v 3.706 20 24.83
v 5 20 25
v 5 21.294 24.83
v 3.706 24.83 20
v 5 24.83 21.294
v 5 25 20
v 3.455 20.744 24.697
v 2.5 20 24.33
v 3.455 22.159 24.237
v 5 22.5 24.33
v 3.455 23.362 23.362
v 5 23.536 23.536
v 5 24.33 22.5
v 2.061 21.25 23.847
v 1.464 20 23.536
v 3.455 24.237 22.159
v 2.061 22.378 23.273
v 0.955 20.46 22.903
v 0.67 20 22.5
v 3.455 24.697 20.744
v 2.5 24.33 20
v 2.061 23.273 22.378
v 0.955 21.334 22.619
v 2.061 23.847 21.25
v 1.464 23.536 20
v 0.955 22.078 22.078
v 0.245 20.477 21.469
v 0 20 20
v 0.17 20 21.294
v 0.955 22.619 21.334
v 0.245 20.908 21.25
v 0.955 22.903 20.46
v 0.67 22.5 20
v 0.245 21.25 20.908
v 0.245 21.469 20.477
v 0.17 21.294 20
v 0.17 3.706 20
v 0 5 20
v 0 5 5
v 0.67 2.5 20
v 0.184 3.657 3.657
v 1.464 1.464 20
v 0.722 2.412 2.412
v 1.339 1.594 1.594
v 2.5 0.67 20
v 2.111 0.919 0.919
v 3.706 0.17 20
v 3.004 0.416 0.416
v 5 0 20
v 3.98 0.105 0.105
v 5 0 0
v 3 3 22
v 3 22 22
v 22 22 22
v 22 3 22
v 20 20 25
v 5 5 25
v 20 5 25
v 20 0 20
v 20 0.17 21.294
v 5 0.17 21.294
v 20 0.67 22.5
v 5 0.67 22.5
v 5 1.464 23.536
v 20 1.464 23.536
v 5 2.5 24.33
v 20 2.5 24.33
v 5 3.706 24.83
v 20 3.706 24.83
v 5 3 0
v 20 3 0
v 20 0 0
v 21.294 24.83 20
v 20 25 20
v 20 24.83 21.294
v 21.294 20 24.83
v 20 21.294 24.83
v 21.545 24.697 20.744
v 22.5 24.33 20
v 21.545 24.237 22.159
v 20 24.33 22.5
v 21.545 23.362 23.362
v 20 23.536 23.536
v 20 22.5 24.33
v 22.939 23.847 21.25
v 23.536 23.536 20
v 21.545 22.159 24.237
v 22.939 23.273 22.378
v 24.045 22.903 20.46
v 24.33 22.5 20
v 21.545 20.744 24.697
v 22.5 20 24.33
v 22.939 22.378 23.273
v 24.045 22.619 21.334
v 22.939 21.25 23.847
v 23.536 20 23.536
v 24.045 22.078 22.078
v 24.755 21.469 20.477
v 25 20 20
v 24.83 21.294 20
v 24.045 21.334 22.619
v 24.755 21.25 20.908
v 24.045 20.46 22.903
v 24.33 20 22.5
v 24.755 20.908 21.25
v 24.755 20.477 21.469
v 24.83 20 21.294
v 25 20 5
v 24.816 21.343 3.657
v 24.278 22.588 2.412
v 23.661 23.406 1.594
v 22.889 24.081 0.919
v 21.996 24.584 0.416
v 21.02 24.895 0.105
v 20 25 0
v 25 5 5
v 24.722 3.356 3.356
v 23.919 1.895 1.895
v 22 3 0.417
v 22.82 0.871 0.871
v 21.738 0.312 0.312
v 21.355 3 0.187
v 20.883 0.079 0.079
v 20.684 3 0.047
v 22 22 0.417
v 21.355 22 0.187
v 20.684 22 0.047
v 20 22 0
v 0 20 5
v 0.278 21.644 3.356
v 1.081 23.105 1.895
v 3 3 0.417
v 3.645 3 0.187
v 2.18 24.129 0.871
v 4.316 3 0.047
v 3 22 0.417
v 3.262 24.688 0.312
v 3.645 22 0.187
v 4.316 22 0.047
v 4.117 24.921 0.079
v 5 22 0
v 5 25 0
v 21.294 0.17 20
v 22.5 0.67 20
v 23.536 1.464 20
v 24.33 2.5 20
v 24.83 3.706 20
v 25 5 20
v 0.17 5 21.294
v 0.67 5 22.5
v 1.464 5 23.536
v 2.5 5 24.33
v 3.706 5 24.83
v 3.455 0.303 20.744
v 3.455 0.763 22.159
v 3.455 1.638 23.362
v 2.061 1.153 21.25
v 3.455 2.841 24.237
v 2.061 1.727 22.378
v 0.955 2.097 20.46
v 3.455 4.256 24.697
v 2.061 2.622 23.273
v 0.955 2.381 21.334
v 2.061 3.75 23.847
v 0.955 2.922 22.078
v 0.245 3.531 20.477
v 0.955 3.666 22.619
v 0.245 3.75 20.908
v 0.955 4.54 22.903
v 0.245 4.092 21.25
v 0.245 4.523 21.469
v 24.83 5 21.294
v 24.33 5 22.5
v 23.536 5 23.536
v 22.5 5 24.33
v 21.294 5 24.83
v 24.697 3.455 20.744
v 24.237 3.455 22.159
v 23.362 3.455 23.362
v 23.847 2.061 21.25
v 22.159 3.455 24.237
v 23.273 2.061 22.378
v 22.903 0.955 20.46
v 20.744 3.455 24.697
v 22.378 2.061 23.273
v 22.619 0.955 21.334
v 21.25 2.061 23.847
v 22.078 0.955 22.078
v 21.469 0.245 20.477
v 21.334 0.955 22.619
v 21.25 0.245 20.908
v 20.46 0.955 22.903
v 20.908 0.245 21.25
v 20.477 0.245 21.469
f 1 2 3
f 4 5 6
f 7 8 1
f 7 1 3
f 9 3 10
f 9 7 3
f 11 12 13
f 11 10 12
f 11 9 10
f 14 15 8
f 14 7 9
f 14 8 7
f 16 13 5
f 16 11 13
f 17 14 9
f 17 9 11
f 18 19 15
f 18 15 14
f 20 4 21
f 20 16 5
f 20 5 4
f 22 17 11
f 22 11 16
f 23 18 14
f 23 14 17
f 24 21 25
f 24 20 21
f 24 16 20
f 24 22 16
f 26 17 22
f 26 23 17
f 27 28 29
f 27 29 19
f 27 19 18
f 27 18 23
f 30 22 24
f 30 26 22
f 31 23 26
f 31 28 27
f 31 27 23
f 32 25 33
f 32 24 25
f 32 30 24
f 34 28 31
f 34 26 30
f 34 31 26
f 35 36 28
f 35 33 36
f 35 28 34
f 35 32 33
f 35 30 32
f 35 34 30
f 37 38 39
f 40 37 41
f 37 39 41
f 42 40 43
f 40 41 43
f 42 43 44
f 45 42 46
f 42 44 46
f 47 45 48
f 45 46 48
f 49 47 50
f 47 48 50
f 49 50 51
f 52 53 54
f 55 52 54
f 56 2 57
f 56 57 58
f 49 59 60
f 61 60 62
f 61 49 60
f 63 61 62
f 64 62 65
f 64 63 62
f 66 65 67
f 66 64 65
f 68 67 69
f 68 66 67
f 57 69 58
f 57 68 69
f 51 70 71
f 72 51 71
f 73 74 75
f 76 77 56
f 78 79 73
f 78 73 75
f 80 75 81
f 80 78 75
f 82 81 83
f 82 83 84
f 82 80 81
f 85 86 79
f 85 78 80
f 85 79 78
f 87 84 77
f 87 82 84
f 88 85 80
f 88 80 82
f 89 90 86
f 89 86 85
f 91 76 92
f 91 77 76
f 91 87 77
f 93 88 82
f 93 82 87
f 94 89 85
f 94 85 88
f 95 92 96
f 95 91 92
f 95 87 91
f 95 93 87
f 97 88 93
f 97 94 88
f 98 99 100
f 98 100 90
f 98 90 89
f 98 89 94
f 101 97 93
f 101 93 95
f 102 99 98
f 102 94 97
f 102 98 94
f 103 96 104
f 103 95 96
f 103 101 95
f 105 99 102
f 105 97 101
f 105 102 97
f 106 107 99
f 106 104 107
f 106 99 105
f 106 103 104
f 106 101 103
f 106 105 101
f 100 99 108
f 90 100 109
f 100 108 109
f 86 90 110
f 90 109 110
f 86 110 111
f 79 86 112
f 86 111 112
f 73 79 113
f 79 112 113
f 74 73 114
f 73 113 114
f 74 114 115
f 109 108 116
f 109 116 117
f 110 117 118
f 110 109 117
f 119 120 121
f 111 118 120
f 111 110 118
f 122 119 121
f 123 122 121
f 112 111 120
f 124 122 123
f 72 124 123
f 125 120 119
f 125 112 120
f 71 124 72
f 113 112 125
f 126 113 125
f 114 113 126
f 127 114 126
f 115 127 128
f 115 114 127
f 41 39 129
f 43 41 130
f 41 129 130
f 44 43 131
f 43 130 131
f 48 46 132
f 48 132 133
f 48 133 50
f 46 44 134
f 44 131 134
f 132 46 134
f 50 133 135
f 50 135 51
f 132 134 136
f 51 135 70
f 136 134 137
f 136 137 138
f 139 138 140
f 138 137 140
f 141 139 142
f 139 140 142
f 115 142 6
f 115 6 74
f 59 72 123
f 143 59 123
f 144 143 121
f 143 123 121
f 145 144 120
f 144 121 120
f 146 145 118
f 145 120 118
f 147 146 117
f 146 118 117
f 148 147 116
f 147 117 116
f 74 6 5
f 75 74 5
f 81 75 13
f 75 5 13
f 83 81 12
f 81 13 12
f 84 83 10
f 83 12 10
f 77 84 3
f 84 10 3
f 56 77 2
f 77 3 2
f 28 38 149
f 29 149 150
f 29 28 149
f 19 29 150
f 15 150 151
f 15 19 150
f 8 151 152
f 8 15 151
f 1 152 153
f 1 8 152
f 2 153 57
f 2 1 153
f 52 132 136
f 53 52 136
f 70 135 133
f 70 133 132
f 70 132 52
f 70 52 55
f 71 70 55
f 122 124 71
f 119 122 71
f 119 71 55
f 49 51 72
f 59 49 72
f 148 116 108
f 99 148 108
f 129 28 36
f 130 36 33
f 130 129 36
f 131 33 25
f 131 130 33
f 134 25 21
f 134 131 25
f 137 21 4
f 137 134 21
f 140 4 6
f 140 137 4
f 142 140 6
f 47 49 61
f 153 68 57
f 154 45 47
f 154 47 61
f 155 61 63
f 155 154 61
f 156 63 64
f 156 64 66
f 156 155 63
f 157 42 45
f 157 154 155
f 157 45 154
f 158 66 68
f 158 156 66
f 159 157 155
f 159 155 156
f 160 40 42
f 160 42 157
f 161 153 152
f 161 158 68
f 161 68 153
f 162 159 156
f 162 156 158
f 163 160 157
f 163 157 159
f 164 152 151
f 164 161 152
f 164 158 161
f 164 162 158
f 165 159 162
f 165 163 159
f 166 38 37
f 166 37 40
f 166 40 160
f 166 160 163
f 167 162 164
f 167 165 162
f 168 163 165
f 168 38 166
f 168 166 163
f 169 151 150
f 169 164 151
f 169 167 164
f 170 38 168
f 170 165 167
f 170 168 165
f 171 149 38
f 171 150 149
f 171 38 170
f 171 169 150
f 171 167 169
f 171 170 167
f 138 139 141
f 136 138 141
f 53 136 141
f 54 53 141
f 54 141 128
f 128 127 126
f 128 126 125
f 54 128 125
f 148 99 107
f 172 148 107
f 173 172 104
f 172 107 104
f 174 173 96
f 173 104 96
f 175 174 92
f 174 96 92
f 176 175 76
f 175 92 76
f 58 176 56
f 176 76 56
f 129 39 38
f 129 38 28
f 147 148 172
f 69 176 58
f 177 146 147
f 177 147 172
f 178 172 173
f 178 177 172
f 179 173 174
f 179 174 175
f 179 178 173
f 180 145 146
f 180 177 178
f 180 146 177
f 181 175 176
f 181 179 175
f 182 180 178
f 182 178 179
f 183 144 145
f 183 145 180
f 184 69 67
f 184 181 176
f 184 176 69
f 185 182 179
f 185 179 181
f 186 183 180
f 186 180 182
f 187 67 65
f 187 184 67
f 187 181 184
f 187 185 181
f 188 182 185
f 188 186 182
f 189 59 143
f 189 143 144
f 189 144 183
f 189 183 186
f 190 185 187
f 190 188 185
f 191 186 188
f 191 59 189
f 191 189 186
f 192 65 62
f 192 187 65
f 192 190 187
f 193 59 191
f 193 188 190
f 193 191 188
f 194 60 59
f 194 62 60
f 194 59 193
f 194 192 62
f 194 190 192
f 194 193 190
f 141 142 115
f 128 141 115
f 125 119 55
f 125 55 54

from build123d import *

# Parameters (mm, degrees)
F0_W         = 25
F0_H         = 25
F1_DEPTH     = 25
F2_T         = -3
F3_T1_DEPTH  = 32.5
F3_T3_DEPTH  = 50
F3_T5_DEPTH  = 15
F3_T7_DEPTH  = 15
F3_S11_W     = 5
F3_S11_H     = 5
F3_T12_DEPTH = 5
F3_S17_W     = 5
F3_S17_H     = 5
F3_T18_DEPTH = 5
F3_S23_W     = 5
F3_S23_H     = 5
F3_T24_DEPTH = 5
F3_S29_W     = 5
F3_S29_H     = 5
F3_T30_DEPTH = 5


# Not quite as in the source:
# - a fillet or chamfer that OpenCascade refuses, or shapes differently, is made with other operations: its cross-section is extruded or revolved along the edge and cut away or added


with BuildPart() as f1:
    # F0 (on Top) → F1 (new body)
    with BuildSketch(Plane.XY):
        with Locations((12.5, 12.5)):
            Rectangle(F0_W, F0_H)
    extrude(amount=F1_DEPTH)

    # F2
    f2_openings = [f1.faces().sort_by_distance(p)[0] for p in [
        (12.5, 12.5, 0),
    ]]
    offset(amount=F2_T, openings=f2_openings)

    # F3: fillet of radius 5 on 10 edges, made by hand

    # F3_s2 → F3_t1 (cut)
    with BuildSketch(Plane.XY.offset(-12.5)):
        with BuildLine():
            ThreePointArc((25, 20), (23.5355339059, 23.5355339059), (20, 25))
            Line((20, 25), (25, 25))
            Line((25, 25), (25, 20))
        make_face()
        with BuildLine():
            ThreePointArc((20, 0), (23.5355339059, 1.4644660941), (25, 5))
            Line((25, 5), (25, 0))
            Line((25, 0), (20, 0))
        make_face()
        with BuildLine():
            ThreePointArc((0, 20), (1.4644660941, 23.5355339059), (5, 25))
            Line((5, 25), (0, 25))
            Line((0, 25), (0, 20))
        make_face()
        with BuildLine():
            ThreePointArc((0, 5), (1.4644660941, 1.4644660941), (5, 0))
            Line((5, 0), (0, 0))
            Line((0, 0), (0, 5))
        make_face()
    extrude(amount=F3_T1_DEPTH, mode=Mode.SUBTRACT)

    # F3_s4 → F3_t3 (cut)
    with BuildSketch(Plane.XZ.offset(-37.5)):
        with BuildLine():
            ThreePointArc((25, 5), (23.5355339059, 1.4644660941), (20, 0))
            Line((20, 0), (25, 0))
            Line((25, 0), (25, 5))
        make_face()
        with BuildLine():
            ThreePointArc((0, 5), (1.4644660941, 1.4644660941), (5, 0))
            Line((5, 0), (0, 0))
            Line((0, 0), (0, 5))
        make_face()
    extrude(amount=F3_T3_DEPTH, mode=Mode.SUBTRACT)

    # F3_s6 → F3_t5 (cut)
    with BuildSketch(Plane.XZ.offset(-20)):
        with BuildLine():
            ThreePointArc((25, 20), (23.5355339059, 23.5355339059), (20, 25))
            Line((20, 25), (25, 25))
            Line((25, 25), (25, 20))
        make_face()
        with BuildLine():
            ThreePointArc((0, 20), (1.4644660941, 23.5355339059), (5, 25))
            Line((5, 25), (0, 25))
            Line((0, 25), (0, 20))
        make_face()
    extrude(amount=F3_T5_DEPTH, mode=Mode.SUBTRACT)

    # F3_s8 → F3_t7 (cut)
    with BuildSketch(Plane.YZ.offset(5)):
        with BuildLine():
            ThreePointArc((0, 20), (1.4644660941, 23.5355339059), (5, 25))
            Line((5, 25), (0, 25))
            Line((0, 25), (0, 20))
        make_face()
        with BuildLine():
            ThreePointArc((25, 20), (23.5355339059, 23.5355339059), (20, 25))
            Line((20, 25), (25, 25))
            Line((25, 25), (25, 20))
        make_face()
    extrude(amount=F3_T7_DEPTH, mode=Mode.SUBTRACT)


with BuildPart() as f3_tool10:
    # F3_s11 → F3_t12 (new body)
    with BuildSketch(Plane.YZ.offset(20)):
        with Locations((22.5, 22.5)):
            Rectangle(F3_S11_W, F3_S11_H)
    extrude(amount=F3_T12_DEPTH)

    # F3_s13 → F3_t14 (revolve, cut)
    with BuildSketch(Plane(origin=(20, 20, 20), x_dir=(0, -0.7071067812, -0.7071067812), z_dir=(0, -0.7071067812, 0.7071067812))):
        with BuildLine():
            ThreePointArc((0, -5), (5, 0), (0, 5))
            Line((0, 5), (0, -5))
        make_face()
    revolve(axis=Axis((20, 20, 20), (1, 0, 0)), mode=Mode.SUBTRACT)


with BuildPart() as f1_1:
    add(f1.part)

    # F3_t9: cut F3_tool10
    add(f3_tool10.part, mode=Mode.SUBTRACT)


with BuildPart() as f3_tool16:
    # F3_s17 → F3_t18 (new body)
    with BuildSketch(Plane.XZ.offset(-5)):
        with Locations((22.5, 22.5)):
            Rectangle(F3_S17_W, F3_S17_H)
    extrude(amount=F3_T18_DEPTH)

    # F3_s19 → F3_t20 (revolve, cut)
    with BuildSketch(Plane(origin=(20, 5, 20), x_dir=(-0.7071067812, 0, -0.7071067812), z_dir=(-0.7071067812, 0, 0.7071067812))):
        with BuildLine():
            ThreePointArc((0, -5), (5, 0), (0, 5))
            Line((0, 5), (0, -5))
        make_face()
    revolve(axis=Axis((20, 5, 20), (0, -1, 0)), mode=Mode.SUBTRACT)


with BuildPart() as f1_2:
    add(f1_1.part)

    # F3_t15: cut F3_tool16
    add(f3_tool16.part, mode=Mode.SUBTRACT)


with BuildPart() as f3_tool22:
    # F3_s23 → F3_t24 (new body)
    with BuildSketch(Plane.YZ.offset(5)):
        with Locations((22.5, 22.5)):
            Rectangle(F3_S23_W, F3_S23_H)
    extrude(amount=-F3_T24_DEPTH)

    # F3_s25 → F3_t26 (revolve, cut)
    with BuildSketch(Plane(origin=(5, 20, 20), x_dir=(0, -0.7071067812, -0.7071067812), z_dir=(0, 0.7071067812, -0.7071067812))):
        with BuildLine():
            ThreePointArc((0, -5), (5, 0), (0, 5))
            Line((0, 5), (0, -5))
        make_face()
    revolve(axis=Axis((5, 20, 20), (-1, 0, 0)), mode=Mode.SUBTRACT)


with BuildPart() as f1_3:
    add(f1_2.part)

    # F3_t21: cut F3_tool22
    add(f3_tool22.part, mode=Mode.SUBTRACT)


with BuildPart() as f3_tool28:
    # F3_s29 → F3_t30 (new body)
    with BuildSketch(Plane.YZ.offset(5)):
        with Locations((2.5, 22.5)):
            Rectangle(F3_S29_W, F3_S29_H)
    extrude(amount=-F3_T30_DEPTH)

    # F3_s31 → F3_t32 (revolve, cut)
    with BuildSketch(Plane(origin=(5, 5, 20), x_dir=(0, 0.7071067812, -0.7071067812), z_dir=(0, 0.7071067812, 0.7071067812))):
        with BuildLine():
            ThreePointArc((0, -5), (5, 0), (0, 5))
            Line((0, 5), (0, -5))
        make_face()
    revolve(axis=Axis((5, 5, 20), (-1, 0, 0)), mode=Mode.SUBTRACT)


with BuildPart() as f1_4:
    add(f1_3.part)

    # F3_t27: cut F3_tool28
    add(f3_tool28.part, mode=Mode.SUBTRACT)


solid = f1_4.part
